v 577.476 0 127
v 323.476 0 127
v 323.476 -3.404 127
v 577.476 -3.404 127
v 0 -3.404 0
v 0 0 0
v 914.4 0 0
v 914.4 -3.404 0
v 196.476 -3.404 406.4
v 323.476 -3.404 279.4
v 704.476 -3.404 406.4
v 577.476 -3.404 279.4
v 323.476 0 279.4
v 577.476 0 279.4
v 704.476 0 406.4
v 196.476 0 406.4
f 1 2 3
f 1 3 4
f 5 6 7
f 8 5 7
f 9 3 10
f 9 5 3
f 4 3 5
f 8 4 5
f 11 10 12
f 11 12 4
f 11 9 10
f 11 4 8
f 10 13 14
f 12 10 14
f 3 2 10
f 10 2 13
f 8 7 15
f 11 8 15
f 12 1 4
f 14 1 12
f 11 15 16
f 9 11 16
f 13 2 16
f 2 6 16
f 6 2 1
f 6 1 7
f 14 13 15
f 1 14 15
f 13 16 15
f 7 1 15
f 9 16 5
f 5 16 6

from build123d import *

# Parameters (mm, degrees)
F0_W     = 254
F0_H     = 152.4
F1_DEPTH = 3.4036


# Not quite as in the source:
# - a feature names something its author has since deleted; it is built from what else it names


with BuildPart() as f1:
    # F0 (on Front) → F1 (new body)
    with BuildSketch(Plane.XZ):
        Polygon((196.4755472482, 406.4), (0, 0), (914.4, 0), (704.4755472482, 406.4), align=None)
        with Locations((450.4755472482, 203.2)):
            Rectangle(F0_W, F0_H, mode=Mode.SUBTRACT)
    extrude(amount=F1_DEPTH)


solid = f1.part
